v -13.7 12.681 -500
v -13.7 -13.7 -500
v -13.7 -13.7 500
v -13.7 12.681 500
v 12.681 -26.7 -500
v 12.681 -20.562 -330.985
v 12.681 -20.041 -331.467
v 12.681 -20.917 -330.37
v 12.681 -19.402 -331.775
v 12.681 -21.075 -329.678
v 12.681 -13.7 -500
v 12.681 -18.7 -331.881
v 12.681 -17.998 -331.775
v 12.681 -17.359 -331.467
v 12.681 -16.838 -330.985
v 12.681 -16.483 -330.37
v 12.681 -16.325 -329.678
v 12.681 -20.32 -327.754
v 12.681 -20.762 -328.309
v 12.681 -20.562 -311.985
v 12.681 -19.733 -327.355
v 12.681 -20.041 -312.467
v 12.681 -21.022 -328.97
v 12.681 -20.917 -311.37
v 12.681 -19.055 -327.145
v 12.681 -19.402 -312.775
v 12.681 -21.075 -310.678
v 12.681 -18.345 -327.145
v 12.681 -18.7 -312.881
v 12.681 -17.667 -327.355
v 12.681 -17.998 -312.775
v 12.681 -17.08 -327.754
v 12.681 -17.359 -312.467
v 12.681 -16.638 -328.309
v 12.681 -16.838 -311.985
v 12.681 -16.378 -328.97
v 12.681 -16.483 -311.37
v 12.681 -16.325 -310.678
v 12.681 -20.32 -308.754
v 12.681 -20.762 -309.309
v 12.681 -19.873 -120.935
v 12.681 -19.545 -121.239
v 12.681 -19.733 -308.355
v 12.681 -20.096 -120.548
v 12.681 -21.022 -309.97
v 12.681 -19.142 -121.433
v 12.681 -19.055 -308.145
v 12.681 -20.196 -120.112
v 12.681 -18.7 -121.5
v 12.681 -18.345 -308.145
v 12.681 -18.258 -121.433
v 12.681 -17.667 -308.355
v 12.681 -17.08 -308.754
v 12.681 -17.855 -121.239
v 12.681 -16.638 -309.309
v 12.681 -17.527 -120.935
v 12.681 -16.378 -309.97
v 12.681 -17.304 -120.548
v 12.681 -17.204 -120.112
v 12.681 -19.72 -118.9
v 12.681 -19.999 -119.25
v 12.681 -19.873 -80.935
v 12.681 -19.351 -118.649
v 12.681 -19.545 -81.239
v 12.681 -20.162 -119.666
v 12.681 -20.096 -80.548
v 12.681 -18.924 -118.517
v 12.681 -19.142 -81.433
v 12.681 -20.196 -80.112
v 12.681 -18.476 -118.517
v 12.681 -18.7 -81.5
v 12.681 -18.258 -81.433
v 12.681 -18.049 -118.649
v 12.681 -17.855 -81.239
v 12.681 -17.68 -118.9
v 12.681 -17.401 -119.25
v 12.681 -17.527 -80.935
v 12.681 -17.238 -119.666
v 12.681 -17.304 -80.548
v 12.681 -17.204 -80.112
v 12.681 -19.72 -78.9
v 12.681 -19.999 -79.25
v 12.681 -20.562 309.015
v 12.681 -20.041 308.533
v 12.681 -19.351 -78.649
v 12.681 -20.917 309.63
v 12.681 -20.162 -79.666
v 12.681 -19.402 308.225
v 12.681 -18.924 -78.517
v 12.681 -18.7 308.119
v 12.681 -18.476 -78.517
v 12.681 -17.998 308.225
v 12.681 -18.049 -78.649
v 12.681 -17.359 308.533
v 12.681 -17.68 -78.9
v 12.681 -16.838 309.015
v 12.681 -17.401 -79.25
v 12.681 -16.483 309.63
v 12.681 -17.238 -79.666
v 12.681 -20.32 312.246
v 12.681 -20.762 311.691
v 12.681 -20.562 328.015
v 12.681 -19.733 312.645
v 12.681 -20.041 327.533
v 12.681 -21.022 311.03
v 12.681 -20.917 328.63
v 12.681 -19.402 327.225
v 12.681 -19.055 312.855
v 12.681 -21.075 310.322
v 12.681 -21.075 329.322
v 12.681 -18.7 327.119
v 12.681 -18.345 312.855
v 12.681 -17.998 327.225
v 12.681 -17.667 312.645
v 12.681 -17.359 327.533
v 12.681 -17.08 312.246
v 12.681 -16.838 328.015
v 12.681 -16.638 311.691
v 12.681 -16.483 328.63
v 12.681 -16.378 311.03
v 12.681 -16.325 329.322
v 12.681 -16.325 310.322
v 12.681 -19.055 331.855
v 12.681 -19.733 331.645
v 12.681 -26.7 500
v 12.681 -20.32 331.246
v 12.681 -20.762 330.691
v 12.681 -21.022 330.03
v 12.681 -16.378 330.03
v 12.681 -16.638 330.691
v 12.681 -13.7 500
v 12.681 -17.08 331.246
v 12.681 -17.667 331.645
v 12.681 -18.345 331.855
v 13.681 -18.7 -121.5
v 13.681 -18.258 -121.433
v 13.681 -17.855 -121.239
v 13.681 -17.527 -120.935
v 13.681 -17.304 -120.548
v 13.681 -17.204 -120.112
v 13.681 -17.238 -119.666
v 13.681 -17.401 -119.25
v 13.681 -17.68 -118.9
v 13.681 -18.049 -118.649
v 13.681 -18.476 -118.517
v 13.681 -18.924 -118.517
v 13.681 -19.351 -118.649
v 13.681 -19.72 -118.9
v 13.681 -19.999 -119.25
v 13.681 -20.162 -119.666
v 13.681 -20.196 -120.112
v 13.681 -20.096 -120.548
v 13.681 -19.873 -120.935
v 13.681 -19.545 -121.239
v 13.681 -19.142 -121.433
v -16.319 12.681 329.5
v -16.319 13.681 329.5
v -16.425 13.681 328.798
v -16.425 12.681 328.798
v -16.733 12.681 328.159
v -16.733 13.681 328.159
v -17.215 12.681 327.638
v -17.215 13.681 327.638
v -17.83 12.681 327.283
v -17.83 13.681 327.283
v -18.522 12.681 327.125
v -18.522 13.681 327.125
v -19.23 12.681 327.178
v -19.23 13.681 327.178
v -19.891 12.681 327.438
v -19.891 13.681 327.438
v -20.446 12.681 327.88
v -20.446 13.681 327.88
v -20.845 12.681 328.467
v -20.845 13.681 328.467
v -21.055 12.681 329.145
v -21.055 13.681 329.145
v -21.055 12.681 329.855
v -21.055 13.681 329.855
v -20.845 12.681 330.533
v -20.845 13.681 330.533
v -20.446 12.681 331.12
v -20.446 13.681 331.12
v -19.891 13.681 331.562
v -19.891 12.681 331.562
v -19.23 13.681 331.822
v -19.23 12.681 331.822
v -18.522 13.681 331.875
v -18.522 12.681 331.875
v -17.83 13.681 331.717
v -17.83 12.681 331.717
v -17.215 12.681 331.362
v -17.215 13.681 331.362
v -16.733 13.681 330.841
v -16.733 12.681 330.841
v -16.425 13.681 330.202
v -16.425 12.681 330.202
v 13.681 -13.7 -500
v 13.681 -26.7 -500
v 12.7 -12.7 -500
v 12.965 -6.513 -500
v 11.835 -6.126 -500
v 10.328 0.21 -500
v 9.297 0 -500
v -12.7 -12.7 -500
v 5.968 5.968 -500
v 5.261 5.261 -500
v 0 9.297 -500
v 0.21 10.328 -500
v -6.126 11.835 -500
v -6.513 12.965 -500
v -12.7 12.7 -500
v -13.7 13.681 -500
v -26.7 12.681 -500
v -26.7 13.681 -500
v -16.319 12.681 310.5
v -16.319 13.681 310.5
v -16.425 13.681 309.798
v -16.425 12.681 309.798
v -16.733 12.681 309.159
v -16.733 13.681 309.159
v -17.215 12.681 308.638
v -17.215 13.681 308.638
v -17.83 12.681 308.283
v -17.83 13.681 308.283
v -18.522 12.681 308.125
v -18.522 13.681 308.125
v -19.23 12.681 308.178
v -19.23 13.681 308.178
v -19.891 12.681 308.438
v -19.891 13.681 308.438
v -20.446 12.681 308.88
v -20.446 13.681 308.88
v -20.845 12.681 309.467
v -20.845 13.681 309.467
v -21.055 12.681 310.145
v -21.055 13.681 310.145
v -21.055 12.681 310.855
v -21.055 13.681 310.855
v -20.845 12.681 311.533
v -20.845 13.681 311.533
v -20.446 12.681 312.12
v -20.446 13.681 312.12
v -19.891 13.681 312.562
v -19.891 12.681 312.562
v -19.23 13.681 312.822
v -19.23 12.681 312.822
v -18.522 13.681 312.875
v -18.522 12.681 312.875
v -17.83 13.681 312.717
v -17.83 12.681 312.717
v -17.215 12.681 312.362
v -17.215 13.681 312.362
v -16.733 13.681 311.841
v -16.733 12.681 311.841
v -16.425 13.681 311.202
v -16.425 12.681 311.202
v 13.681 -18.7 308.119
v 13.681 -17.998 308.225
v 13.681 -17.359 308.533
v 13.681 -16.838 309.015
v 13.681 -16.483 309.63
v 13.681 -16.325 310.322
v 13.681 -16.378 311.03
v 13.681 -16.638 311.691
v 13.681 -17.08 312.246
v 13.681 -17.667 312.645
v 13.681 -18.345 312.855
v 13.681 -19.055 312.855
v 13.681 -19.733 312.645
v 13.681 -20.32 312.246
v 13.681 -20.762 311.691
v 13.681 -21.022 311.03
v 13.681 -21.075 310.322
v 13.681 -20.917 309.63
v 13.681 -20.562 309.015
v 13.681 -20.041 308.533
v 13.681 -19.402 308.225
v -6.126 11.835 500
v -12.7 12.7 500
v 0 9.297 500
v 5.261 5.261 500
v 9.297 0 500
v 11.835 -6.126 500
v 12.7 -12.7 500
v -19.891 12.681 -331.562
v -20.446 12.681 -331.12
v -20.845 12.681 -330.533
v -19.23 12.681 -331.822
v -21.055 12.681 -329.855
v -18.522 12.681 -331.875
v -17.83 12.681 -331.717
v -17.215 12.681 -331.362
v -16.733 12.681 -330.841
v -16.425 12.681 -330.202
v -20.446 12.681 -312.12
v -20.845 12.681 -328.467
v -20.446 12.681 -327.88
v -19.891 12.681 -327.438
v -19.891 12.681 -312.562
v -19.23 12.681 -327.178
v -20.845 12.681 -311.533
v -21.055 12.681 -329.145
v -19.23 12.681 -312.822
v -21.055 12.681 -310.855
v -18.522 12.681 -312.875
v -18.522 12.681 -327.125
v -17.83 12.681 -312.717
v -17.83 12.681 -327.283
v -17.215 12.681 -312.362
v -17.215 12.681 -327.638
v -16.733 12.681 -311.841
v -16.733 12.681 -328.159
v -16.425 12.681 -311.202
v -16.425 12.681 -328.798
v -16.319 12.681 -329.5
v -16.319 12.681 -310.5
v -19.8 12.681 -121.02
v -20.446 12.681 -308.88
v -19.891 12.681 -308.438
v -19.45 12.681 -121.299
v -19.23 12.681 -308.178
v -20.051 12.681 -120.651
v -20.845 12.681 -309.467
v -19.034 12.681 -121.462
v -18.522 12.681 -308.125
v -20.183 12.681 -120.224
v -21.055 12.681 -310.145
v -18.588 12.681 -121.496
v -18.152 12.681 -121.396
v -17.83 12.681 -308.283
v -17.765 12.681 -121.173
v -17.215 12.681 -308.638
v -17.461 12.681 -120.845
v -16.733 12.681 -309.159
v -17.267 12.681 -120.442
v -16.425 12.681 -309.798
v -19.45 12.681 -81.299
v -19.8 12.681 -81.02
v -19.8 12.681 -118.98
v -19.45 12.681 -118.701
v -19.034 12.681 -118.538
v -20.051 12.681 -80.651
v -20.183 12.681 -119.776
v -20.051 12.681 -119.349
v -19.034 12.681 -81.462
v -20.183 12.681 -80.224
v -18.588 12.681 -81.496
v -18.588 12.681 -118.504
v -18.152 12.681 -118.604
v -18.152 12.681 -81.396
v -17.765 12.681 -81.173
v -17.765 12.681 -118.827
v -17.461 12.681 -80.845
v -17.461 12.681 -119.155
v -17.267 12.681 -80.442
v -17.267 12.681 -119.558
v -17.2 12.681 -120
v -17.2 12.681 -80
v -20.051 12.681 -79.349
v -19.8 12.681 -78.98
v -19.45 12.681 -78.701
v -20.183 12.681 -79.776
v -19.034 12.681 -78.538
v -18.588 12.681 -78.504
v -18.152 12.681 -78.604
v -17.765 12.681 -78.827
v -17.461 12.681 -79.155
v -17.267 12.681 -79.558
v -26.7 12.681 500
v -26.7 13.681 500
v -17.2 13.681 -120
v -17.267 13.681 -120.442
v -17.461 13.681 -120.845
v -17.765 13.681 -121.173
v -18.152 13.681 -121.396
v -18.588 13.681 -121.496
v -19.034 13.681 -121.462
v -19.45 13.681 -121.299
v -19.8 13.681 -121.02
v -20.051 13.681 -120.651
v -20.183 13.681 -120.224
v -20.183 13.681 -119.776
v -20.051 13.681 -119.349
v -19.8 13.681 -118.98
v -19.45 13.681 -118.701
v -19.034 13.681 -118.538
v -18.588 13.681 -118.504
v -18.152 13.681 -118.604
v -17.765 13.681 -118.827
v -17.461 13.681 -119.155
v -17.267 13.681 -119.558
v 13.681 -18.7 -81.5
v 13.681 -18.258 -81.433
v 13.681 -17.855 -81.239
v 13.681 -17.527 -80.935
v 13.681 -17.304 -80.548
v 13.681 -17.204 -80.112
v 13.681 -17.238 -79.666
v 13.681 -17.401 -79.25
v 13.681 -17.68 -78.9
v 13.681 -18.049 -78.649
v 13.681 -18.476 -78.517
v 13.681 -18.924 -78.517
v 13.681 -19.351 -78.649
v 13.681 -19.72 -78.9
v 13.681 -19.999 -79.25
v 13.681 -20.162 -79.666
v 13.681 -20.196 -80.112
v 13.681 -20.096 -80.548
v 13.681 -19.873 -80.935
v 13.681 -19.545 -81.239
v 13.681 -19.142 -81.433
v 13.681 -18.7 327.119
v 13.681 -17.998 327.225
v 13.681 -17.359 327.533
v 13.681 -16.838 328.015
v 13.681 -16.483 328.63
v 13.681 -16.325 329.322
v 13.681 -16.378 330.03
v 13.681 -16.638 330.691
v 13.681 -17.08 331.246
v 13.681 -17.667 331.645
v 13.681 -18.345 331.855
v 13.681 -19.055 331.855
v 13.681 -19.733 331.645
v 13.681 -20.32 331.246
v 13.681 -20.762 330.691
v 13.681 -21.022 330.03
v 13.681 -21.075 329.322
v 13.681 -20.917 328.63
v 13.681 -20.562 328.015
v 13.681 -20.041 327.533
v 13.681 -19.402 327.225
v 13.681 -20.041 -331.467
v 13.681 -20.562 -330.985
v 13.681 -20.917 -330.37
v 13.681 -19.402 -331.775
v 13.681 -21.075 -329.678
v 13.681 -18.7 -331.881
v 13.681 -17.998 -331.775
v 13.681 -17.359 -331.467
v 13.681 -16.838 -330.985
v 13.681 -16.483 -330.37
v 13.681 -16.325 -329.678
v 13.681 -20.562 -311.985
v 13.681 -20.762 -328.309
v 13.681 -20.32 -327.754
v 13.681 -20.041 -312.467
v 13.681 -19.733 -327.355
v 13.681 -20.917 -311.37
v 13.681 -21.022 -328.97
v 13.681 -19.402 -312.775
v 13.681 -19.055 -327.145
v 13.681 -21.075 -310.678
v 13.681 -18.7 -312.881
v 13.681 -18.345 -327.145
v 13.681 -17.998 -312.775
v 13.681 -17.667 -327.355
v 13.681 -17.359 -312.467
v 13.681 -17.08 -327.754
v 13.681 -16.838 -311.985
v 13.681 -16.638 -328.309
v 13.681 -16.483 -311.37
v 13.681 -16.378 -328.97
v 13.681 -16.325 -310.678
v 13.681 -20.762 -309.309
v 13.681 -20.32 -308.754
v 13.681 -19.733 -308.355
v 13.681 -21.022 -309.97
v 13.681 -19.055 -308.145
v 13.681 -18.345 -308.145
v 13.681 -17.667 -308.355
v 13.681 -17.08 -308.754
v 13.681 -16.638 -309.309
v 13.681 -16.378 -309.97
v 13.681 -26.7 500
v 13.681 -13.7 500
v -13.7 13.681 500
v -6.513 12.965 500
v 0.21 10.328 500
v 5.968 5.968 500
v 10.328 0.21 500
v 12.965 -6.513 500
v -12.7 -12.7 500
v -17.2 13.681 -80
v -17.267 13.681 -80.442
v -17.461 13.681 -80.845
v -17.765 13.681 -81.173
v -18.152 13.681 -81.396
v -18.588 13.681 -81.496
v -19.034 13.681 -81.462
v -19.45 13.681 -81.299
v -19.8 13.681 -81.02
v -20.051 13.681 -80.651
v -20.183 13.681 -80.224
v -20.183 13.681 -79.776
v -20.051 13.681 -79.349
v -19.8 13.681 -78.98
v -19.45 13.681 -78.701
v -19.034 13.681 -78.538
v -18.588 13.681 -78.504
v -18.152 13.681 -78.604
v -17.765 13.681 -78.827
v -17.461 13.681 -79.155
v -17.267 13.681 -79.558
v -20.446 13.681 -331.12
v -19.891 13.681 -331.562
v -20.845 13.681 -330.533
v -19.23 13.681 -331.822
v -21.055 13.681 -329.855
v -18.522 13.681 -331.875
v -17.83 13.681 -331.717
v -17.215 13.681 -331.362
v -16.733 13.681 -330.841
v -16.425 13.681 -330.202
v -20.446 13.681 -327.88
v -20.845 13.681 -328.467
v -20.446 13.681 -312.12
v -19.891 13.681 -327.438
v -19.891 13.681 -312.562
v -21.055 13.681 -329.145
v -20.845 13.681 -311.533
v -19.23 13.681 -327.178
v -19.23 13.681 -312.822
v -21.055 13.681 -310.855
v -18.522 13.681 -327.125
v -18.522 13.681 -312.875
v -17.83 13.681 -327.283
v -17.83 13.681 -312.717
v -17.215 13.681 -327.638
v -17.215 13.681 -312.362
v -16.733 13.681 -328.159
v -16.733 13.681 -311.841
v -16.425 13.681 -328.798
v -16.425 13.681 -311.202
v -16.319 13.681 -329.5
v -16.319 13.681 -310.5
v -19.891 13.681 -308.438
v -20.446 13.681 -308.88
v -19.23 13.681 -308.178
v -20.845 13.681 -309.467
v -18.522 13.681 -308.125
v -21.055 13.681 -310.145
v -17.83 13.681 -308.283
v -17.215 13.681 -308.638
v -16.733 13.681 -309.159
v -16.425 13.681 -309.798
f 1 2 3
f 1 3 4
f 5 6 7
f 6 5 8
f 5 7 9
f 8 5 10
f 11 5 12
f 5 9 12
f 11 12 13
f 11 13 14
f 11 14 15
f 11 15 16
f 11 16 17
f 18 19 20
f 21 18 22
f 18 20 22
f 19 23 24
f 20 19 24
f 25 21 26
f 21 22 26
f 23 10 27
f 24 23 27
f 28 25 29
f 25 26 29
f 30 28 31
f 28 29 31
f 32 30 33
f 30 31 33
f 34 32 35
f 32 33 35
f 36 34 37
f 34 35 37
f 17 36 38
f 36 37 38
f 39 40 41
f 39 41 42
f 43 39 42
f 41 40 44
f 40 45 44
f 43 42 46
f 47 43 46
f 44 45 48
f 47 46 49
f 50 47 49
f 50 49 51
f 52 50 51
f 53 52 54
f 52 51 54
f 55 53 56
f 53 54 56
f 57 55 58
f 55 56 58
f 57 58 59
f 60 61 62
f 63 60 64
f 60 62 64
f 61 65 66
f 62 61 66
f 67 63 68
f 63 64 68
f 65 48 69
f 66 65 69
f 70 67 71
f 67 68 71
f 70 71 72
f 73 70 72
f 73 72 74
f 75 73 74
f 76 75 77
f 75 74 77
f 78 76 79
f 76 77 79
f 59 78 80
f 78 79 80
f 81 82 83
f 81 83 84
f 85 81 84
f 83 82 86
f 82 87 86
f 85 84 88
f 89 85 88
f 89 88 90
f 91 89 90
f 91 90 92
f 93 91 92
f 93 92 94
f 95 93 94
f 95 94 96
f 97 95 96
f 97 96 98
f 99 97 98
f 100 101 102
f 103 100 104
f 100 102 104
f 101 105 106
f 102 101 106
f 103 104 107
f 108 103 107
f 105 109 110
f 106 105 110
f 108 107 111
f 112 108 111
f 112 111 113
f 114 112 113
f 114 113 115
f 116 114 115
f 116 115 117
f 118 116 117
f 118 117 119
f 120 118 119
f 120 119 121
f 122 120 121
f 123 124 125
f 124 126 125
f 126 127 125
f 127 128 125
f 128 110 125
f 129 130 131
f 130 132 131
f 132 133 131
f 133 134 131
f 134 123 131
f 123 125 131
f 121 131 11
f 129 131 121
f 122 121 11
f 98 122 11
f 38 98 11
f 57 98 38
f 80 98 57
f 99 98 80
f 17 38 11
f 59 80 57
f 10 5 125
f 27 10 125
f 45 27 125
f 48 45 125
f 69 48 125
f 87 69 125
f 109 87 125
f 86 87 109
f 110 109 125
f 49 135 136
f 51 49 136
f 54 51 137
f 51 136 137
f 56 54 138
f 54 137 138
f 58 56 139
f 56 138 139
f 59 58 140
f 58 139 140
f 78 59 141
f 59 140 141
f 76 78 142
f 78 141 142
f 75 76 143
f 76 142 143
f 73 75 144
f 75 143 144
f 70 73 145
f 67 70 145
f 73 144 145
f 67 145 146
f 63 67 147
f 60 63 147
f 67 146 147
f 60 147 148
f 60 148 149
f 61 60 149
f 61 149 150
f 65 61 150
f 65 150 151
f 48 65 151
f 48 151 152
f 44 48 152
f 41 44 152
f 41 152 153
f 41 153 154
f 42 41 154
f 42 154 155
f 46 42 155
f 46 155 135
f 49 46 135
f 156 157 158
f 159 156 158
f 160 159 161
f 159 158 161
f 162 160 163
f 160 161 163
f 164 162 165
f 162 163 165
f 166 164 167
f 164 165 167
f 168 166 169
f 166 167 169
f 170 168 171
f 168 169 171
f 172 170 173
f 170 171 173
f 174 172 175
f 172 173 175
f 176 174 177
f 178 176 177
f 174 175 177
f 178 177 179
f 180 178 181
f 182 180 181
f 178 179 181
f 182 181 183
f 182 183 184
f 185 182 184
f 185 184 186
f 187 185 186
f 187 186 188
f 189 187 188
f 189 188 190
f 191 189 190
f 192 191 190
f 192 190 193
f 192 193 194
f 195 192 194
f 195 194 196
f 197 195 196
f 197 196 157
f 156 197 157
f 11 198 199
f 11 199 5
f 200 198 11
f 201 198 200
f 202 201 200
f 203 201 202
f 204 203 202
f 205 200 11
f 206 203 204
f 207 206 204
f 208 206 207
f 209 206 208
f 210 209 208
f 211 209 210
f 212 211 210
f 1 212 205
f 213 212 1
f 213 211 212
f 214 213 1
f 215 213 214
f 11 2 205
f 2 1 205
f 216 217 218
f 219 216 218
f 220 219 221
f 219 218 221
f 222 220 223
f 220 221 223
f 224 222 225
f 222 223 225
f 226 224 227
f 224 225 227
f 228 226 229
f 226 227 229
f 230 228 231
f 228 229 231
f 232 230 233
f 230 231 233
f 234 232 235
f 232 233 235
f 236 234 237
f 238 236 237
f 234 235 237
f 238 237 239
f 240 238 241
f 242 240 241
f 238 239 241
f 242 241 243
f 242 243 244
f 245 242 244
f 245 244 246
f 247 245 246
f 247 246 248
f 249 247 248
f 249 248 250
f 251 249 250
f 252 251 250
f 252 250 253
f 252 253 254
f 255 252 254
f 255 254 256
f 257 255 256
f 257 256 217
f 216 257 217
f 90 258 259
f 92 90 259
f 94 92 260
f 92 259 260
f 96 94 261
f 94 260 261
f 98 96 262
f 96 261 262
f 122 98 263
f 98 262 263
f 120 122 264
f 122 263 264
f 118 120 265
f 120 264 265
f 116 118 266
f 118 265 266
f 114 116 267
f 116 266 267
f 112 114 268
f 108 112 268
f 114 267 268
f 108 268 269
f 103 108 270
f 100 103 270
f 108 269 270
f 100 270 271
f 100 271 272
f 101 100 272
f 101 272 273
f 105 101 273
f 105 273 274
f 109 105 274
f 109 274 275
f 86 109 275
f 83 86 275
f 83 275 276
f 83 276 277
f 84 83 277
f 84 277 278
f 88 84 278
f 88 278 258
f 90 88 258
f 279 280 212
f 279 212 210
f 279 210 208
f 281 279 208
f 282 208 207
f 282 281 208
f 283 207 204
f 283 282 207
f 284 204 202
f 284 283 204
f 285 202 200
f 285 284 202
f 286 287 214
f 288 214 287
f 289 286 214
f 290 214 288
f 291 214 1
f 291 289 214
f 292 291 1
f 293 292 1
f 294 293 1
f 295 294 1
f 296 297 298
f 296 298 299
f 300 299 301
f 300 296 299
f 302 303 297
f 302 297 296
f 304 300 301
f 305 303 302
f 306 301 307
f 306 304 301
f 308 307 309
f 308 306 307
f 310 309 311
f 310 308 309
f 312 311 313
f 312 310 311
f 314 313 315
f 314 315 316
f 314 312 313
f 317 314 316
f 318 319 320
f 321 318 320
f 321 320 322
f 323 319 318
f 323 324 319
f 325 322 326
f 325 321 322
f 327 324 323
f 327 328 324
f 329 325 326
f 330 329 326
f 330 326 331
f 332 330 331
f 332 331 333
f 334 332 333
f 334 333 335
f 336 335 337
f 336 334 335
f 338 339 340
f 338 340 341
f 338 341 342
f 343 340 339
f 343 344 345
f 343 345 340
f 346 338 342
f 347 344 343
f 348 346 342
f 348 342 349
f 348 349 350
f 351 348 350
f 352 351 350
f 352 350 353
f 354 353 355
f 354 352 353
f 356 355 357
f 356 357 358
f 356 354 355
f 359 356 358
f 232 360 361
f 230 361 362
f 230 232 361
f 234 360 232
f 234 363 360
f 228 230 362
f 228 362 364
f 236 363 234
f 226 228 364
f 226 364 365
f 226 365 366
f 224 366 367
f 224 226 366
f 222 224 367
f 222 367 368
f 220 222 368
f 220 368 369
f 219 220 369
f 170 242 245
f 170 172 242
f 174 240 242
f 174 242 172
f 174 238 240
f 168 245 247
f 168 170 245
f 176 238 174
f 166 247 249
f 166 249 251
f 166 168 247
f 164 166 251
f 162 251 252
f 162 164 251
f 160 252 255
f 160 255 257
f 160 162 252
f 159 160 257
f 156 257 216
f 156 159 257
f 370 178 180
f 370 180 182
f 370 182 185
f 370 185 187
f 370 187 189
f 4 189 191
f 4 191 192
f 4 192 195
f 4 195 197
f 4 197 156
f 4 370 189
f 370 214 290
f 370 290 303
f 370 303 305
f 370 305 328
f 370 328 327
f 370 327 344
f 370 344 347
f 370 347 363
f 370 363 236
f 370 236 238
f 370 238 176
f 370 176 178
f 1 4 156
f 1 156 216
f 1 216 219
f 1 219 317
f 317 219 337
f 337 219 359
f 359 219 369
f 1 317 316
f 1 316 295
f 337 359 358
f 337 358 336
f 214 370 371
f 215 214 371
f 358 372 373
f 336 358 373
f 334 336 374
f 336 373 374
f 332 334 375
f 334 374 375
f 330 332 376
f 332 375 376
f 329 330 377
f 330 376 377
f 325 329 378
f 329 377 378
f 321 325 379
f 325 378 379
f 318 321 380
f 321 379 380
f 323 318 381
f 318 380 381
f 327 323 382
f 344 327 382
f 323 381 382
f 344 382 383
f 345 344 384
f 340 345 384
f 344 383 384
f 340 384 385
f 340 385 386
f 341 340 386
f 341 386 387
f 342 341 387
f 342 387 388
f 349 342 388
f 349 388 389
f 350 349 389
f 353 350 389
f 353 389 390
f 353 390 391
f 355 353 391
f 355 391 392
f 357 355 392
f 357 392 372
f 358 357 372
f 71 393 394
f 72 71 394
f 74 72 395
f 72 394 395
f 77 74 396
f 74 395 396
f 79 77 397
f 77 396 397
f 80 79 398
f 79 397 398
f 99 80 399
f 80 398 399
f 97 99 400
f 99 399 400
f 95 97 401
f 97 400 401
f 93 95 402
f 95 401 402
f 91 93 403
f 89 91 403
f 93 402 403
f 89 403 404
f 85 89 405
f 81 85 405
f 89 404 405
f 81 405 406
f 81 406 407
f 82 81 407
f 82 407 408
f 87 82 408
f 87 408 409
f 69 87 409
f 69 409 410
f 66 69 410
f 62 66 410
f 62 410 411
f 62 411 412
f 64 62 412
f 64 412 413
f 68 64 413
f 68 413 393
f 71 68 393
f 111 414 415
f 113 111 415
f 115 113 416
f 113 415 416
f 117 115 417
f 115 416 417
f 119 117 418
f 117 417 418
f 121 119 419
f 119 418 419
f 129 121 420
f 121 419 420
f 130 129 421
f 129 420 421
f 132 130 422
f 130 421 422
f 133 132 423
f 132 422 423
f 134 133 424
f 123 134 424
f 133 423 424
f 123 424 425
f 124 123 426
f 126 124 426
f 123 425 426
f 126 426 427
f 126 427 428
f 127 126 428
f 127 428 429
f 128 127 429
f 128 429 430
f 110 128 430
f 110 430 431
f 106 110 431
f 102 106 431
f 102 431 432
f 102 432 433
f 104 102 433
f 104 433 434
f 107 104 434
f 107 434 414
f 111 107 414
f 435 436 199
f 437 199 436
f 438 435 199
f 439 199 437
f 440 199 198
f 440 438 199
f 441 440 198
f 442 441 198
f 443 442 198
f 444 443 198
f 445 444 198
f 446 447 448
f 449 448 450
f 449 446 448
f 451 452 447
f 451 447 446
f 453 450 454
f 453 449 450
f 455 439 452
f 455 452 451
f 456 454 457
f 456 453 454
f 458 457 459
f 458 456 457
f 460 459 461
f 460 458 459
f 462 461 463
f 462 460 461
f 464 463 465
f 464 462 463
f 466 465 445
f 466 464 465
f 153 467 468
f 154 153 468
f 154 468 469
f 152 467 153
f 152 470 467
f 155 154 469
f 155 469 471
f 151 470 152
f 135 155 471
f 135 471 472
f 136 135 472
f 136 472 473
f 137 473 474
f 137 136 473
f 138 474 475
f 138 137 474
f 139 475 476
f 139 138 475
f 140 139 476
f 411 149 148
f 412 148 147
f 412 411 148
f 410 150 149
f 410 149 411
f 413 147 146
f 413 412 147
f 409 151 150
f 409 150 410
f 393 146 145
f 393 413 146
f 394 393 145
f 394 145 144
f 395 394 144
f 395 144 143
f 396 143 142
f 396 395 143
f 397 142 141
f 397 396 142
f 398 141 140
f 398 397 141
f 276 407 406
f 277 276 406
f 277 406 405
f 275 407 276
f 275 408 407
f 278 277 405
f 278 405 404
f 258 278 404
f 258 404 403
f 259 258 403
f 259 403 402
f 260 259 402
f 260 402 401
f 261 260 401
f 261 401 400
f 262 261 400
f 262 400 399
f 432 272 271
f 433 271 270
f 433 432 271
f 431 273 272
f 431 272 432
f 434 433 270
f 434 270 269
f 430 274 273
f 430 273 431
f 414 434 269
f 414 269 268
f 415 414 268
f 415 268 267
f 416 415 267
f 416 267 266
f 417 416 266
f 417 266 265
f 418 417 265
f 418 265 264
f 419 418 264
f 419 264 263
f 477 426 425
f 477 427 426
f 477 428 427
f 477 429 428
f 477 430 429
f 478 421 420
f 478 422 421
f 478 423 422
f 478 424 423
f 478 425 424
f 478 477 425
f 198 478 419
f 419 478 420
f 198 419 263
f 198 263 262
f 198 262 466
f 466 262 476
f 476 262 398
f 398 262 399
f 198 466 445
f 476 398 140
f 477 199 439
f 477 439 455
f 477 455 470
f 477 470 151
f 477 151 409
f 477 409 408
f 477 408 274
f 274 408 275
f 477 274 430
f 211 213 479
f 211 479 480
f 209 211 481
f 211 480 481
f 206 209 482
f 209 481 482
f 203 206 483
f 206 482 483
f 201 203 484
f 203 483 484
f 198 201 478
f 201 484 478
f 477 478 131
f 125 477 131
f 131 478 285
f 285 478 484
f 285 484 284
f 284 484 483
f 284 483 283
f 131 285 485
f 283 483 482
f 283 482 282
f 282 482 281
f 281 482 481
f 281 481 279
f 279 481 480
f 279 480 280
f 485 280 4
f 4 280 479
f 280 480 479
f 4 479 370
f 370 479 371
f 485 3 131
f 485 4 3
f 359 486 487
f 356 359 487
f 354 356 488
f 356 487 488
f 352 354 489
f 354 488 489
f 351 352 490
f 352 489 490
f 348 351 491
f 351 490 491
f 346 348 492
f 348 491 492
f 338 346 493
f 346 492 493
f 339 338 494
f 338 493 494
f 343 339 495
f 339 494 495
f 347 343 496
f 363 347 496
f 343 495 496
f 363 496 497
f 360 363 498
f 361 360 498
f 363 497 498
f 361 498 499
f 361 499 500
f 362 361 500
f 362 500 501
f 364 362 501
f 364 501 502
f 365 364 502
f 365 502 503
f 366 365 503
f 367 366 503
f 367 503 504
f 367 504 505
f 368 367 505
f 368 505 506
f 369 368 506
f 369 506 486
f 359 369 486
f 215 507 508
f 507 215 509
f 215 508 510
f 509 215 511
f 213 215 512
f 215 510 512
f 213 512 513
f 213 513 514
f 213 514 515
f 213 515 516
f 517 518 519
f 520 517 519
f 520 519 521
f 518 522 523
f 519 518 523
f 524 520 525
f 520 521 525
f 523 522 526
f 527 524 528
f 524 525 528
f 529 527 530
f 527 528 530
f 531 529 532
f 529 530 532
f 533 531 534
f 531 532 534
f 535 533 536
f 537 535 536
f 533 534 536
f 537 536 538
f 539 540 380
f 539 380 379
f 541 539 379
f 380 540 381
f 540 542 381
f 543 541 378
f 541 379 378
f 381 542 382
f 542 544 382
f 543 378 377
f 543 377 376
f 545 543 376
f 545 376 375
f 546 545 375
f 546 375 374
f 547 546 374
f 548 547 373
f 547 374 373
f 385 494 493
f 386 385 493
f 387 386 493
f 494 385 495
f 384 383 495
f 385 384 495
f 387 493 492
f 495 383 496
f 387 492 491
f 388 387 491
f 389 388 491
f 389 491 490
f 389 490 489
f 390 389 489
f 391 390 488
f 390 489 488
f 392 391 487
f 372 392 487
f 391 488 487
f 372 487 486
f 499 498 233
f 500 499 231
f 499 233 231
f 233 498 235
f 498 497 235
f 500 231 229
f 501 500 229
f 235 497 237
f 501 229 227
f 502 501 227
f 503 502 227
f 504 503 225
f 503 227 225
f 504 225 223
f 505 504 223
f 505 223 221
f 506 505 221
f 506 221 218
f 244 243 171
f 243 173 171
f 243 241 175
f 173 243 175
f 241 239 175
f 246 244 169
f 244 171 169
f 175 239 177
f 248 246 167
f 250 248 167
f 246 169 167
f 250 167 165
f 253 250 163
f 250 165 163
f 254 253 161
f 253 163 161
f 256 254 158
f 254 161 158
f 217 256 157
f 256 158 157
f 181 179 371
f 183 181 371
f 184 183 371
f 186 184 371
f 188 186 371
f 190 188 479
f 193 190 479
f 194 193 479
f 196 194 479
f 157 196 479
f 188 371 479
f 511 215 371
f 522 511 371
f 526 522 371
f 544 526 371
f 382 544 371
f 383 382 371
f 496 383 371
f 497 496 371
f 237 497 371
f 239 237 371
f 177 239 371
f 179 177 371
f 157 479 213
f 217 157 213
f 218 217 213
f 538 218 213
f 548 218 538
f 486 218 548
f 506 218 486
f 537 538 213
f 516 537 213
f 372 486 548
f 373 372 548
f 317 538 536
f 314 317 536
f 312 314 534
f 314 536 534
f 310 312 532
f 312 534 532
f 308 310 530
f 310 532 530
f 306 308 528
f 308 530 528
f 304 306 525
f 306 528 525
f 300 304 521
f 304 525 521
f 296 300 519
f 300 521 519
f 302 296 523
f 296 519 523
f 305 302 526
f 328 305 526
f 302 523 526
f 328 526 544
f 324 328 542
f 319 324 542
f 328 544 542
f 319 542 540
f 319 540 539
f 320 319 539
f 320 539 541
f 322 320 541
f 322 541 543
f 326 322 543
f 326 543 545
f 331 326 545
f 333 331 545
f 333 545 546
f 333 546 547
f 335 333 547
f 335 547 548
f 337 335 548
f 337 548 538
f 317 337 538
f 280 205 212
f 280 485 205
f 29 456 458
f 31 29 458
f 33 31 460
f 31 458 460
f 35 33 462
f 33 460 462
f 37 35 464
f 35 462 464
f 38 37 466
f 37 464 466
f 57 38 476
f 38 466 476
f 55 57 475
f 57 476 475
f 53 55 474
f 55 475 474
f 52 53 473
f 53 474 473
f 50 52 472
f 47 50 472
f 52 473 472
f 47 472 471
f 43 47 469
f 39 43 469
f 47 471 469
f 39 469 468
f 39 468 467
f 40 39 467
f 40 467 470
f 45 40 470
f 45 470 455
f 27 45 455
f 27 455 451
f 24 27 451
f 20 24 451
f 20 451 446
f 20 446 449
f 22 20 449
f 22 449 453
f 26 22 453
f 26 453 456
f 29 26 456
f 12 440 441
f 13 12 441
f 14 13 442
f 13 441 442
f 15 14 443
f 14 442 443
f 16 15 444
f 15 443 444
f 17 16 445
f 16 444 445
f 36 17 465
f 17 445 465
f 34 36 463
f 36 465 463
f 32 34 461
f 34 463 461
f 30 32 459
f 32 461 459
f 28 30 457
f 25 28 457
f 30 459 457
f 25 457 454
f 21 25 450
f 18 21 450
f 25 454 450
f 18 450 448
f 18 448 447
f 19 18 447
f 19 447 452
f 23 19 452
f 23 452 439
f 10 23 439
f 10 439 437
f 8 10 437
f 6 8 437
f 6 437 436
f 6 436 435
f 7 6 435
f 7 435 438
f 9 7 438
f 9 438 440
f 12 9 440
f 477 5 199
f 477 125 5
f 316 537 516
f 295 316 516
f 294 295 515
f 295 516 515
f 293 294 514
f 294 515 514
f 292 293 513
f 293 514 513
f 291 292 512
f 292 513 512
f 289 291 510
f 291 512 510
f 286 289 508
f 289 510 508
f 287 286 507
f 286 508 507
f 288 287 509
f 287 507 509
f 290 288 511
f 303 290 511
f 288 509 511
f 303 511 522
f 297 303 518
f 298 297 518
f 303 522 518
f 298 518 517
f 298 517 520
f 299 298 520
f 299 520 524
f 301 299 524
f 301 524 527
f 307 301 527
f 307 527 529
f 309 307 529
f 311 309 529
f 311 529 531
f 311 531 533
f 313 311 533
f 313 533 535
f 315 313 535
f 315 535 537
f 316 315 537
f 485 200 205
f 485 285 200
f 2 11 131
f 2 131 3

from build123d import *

# Parameters (mm, degrees)
CROQUIS1_W              = 13
CROQUIS1_H              = 1
CROQUIS1_W_2            = 1
CROQUIS1_H_2            = 13
SALIENTE_EXTRUIR1_DEPTH = 500
CROQUIS2_R              = 2.38125
CROQUIS2_R_2            = 1.5
CORTAR_EXTRUIR1_DEPTH   = 10
CROQUIS3_R              = 2.38125
CROQUIS3_R_2            = 1.5
CORTAR_EXTRUIR2_DEPTH   = 10


with BuildPart() as part:
    # Croquis1 → Saliente-Extruir1 (new body, symmetric)
    with BuildSketch(Plane.XY):
        with BuildLine():
            ThreePointArc((-13.7, 13.681053808), (5.967619023, 5.967619023), (13.681053808, -13.7))
            Line((13.681053808, -13.7), (-13.7, -13.7))
            Line((-13.7, -13.7), (-13.7, 13.681053808))
        make_face()
        with BuildLine():
            Line((-12.7, -12.7), (-12.7, 12.7))
            ThreePointArc((-12.7, 12.7), (5.260512242, 5.260512242), (12.7, -12.7))
            Line((12.7, -12.7), (-12.7, -12.7))
        make_face(mode=Mode.SUBTRACT)
        with Locations((-20.2, 13.181053808)):
            Rectangle(CROQUIS1_W, CROQUIS1_H)
        with Locations((13.181053808, -20.2)):
            Rectangle(CROQUIS1_W_2, CROQUIS1_H_2)
    extrude(amount=SALIENTE_EXTRUIR1_DEPTH, both=True)

    # Croquis2 → Cortar-Extruir1 (cut)
    with BuildSketch(Plane(origin=(13.681053808, 0, 0), x_dir=(0, 0, -1), z_dir=(1, 0, 0))):
        with Locations((310.5, -18.7)):
            Circle(CROQUIS2_R)
        with Locations((329.5, -18.7)):
            Circle(CROQUIS2_R)
        with Locations((-329.5, -18.7)):
            Circle(CROQUIS2_R)
        with Locations((-310.5, -18.7)):
            Circle(CROQUIS2_R)
        with Locations((120, -18.7)):
            Circle(CROQUIS2_R_2)
        with Locations((80, -18.7)):
            Circle(CROQUIS2_R_2)
    extrude(amount=-CORTAR_EXTRUIR1_DEPTH, mode=Mode.SUBTRACT)

    # Croquis3 → Cortar-Extruir2 (cut)
    with BuildSketch(Plane(origin=(0, 13.681053808, 0), x_dir=(1, 0, 0), z_dir=(0, 1, 0))):
        with Locations((-18.7, 329.5)):
            Circle(CROQUIS3_R)
        with Locations((-18.7, 310.5)):
            Circle(CROQUIS3_R)
        with Locations((-18.7, -310.5)):
            Circle(CROQUIS3_R)
        with Locations((-18.7, -329.5)):
            Circle(CROQUIS3_R)
        with Locations((-18.7, 120)):
            Circle(CROQUIS3_R_2)
        with Locations((-18.7, 80)):
            Circle(CROQUIS3_R_2)
    extrude(amount=-CORTAR_EXTRUIR2_DEPTH, mode=Mode.SUBTRACT)


solid = part.part
